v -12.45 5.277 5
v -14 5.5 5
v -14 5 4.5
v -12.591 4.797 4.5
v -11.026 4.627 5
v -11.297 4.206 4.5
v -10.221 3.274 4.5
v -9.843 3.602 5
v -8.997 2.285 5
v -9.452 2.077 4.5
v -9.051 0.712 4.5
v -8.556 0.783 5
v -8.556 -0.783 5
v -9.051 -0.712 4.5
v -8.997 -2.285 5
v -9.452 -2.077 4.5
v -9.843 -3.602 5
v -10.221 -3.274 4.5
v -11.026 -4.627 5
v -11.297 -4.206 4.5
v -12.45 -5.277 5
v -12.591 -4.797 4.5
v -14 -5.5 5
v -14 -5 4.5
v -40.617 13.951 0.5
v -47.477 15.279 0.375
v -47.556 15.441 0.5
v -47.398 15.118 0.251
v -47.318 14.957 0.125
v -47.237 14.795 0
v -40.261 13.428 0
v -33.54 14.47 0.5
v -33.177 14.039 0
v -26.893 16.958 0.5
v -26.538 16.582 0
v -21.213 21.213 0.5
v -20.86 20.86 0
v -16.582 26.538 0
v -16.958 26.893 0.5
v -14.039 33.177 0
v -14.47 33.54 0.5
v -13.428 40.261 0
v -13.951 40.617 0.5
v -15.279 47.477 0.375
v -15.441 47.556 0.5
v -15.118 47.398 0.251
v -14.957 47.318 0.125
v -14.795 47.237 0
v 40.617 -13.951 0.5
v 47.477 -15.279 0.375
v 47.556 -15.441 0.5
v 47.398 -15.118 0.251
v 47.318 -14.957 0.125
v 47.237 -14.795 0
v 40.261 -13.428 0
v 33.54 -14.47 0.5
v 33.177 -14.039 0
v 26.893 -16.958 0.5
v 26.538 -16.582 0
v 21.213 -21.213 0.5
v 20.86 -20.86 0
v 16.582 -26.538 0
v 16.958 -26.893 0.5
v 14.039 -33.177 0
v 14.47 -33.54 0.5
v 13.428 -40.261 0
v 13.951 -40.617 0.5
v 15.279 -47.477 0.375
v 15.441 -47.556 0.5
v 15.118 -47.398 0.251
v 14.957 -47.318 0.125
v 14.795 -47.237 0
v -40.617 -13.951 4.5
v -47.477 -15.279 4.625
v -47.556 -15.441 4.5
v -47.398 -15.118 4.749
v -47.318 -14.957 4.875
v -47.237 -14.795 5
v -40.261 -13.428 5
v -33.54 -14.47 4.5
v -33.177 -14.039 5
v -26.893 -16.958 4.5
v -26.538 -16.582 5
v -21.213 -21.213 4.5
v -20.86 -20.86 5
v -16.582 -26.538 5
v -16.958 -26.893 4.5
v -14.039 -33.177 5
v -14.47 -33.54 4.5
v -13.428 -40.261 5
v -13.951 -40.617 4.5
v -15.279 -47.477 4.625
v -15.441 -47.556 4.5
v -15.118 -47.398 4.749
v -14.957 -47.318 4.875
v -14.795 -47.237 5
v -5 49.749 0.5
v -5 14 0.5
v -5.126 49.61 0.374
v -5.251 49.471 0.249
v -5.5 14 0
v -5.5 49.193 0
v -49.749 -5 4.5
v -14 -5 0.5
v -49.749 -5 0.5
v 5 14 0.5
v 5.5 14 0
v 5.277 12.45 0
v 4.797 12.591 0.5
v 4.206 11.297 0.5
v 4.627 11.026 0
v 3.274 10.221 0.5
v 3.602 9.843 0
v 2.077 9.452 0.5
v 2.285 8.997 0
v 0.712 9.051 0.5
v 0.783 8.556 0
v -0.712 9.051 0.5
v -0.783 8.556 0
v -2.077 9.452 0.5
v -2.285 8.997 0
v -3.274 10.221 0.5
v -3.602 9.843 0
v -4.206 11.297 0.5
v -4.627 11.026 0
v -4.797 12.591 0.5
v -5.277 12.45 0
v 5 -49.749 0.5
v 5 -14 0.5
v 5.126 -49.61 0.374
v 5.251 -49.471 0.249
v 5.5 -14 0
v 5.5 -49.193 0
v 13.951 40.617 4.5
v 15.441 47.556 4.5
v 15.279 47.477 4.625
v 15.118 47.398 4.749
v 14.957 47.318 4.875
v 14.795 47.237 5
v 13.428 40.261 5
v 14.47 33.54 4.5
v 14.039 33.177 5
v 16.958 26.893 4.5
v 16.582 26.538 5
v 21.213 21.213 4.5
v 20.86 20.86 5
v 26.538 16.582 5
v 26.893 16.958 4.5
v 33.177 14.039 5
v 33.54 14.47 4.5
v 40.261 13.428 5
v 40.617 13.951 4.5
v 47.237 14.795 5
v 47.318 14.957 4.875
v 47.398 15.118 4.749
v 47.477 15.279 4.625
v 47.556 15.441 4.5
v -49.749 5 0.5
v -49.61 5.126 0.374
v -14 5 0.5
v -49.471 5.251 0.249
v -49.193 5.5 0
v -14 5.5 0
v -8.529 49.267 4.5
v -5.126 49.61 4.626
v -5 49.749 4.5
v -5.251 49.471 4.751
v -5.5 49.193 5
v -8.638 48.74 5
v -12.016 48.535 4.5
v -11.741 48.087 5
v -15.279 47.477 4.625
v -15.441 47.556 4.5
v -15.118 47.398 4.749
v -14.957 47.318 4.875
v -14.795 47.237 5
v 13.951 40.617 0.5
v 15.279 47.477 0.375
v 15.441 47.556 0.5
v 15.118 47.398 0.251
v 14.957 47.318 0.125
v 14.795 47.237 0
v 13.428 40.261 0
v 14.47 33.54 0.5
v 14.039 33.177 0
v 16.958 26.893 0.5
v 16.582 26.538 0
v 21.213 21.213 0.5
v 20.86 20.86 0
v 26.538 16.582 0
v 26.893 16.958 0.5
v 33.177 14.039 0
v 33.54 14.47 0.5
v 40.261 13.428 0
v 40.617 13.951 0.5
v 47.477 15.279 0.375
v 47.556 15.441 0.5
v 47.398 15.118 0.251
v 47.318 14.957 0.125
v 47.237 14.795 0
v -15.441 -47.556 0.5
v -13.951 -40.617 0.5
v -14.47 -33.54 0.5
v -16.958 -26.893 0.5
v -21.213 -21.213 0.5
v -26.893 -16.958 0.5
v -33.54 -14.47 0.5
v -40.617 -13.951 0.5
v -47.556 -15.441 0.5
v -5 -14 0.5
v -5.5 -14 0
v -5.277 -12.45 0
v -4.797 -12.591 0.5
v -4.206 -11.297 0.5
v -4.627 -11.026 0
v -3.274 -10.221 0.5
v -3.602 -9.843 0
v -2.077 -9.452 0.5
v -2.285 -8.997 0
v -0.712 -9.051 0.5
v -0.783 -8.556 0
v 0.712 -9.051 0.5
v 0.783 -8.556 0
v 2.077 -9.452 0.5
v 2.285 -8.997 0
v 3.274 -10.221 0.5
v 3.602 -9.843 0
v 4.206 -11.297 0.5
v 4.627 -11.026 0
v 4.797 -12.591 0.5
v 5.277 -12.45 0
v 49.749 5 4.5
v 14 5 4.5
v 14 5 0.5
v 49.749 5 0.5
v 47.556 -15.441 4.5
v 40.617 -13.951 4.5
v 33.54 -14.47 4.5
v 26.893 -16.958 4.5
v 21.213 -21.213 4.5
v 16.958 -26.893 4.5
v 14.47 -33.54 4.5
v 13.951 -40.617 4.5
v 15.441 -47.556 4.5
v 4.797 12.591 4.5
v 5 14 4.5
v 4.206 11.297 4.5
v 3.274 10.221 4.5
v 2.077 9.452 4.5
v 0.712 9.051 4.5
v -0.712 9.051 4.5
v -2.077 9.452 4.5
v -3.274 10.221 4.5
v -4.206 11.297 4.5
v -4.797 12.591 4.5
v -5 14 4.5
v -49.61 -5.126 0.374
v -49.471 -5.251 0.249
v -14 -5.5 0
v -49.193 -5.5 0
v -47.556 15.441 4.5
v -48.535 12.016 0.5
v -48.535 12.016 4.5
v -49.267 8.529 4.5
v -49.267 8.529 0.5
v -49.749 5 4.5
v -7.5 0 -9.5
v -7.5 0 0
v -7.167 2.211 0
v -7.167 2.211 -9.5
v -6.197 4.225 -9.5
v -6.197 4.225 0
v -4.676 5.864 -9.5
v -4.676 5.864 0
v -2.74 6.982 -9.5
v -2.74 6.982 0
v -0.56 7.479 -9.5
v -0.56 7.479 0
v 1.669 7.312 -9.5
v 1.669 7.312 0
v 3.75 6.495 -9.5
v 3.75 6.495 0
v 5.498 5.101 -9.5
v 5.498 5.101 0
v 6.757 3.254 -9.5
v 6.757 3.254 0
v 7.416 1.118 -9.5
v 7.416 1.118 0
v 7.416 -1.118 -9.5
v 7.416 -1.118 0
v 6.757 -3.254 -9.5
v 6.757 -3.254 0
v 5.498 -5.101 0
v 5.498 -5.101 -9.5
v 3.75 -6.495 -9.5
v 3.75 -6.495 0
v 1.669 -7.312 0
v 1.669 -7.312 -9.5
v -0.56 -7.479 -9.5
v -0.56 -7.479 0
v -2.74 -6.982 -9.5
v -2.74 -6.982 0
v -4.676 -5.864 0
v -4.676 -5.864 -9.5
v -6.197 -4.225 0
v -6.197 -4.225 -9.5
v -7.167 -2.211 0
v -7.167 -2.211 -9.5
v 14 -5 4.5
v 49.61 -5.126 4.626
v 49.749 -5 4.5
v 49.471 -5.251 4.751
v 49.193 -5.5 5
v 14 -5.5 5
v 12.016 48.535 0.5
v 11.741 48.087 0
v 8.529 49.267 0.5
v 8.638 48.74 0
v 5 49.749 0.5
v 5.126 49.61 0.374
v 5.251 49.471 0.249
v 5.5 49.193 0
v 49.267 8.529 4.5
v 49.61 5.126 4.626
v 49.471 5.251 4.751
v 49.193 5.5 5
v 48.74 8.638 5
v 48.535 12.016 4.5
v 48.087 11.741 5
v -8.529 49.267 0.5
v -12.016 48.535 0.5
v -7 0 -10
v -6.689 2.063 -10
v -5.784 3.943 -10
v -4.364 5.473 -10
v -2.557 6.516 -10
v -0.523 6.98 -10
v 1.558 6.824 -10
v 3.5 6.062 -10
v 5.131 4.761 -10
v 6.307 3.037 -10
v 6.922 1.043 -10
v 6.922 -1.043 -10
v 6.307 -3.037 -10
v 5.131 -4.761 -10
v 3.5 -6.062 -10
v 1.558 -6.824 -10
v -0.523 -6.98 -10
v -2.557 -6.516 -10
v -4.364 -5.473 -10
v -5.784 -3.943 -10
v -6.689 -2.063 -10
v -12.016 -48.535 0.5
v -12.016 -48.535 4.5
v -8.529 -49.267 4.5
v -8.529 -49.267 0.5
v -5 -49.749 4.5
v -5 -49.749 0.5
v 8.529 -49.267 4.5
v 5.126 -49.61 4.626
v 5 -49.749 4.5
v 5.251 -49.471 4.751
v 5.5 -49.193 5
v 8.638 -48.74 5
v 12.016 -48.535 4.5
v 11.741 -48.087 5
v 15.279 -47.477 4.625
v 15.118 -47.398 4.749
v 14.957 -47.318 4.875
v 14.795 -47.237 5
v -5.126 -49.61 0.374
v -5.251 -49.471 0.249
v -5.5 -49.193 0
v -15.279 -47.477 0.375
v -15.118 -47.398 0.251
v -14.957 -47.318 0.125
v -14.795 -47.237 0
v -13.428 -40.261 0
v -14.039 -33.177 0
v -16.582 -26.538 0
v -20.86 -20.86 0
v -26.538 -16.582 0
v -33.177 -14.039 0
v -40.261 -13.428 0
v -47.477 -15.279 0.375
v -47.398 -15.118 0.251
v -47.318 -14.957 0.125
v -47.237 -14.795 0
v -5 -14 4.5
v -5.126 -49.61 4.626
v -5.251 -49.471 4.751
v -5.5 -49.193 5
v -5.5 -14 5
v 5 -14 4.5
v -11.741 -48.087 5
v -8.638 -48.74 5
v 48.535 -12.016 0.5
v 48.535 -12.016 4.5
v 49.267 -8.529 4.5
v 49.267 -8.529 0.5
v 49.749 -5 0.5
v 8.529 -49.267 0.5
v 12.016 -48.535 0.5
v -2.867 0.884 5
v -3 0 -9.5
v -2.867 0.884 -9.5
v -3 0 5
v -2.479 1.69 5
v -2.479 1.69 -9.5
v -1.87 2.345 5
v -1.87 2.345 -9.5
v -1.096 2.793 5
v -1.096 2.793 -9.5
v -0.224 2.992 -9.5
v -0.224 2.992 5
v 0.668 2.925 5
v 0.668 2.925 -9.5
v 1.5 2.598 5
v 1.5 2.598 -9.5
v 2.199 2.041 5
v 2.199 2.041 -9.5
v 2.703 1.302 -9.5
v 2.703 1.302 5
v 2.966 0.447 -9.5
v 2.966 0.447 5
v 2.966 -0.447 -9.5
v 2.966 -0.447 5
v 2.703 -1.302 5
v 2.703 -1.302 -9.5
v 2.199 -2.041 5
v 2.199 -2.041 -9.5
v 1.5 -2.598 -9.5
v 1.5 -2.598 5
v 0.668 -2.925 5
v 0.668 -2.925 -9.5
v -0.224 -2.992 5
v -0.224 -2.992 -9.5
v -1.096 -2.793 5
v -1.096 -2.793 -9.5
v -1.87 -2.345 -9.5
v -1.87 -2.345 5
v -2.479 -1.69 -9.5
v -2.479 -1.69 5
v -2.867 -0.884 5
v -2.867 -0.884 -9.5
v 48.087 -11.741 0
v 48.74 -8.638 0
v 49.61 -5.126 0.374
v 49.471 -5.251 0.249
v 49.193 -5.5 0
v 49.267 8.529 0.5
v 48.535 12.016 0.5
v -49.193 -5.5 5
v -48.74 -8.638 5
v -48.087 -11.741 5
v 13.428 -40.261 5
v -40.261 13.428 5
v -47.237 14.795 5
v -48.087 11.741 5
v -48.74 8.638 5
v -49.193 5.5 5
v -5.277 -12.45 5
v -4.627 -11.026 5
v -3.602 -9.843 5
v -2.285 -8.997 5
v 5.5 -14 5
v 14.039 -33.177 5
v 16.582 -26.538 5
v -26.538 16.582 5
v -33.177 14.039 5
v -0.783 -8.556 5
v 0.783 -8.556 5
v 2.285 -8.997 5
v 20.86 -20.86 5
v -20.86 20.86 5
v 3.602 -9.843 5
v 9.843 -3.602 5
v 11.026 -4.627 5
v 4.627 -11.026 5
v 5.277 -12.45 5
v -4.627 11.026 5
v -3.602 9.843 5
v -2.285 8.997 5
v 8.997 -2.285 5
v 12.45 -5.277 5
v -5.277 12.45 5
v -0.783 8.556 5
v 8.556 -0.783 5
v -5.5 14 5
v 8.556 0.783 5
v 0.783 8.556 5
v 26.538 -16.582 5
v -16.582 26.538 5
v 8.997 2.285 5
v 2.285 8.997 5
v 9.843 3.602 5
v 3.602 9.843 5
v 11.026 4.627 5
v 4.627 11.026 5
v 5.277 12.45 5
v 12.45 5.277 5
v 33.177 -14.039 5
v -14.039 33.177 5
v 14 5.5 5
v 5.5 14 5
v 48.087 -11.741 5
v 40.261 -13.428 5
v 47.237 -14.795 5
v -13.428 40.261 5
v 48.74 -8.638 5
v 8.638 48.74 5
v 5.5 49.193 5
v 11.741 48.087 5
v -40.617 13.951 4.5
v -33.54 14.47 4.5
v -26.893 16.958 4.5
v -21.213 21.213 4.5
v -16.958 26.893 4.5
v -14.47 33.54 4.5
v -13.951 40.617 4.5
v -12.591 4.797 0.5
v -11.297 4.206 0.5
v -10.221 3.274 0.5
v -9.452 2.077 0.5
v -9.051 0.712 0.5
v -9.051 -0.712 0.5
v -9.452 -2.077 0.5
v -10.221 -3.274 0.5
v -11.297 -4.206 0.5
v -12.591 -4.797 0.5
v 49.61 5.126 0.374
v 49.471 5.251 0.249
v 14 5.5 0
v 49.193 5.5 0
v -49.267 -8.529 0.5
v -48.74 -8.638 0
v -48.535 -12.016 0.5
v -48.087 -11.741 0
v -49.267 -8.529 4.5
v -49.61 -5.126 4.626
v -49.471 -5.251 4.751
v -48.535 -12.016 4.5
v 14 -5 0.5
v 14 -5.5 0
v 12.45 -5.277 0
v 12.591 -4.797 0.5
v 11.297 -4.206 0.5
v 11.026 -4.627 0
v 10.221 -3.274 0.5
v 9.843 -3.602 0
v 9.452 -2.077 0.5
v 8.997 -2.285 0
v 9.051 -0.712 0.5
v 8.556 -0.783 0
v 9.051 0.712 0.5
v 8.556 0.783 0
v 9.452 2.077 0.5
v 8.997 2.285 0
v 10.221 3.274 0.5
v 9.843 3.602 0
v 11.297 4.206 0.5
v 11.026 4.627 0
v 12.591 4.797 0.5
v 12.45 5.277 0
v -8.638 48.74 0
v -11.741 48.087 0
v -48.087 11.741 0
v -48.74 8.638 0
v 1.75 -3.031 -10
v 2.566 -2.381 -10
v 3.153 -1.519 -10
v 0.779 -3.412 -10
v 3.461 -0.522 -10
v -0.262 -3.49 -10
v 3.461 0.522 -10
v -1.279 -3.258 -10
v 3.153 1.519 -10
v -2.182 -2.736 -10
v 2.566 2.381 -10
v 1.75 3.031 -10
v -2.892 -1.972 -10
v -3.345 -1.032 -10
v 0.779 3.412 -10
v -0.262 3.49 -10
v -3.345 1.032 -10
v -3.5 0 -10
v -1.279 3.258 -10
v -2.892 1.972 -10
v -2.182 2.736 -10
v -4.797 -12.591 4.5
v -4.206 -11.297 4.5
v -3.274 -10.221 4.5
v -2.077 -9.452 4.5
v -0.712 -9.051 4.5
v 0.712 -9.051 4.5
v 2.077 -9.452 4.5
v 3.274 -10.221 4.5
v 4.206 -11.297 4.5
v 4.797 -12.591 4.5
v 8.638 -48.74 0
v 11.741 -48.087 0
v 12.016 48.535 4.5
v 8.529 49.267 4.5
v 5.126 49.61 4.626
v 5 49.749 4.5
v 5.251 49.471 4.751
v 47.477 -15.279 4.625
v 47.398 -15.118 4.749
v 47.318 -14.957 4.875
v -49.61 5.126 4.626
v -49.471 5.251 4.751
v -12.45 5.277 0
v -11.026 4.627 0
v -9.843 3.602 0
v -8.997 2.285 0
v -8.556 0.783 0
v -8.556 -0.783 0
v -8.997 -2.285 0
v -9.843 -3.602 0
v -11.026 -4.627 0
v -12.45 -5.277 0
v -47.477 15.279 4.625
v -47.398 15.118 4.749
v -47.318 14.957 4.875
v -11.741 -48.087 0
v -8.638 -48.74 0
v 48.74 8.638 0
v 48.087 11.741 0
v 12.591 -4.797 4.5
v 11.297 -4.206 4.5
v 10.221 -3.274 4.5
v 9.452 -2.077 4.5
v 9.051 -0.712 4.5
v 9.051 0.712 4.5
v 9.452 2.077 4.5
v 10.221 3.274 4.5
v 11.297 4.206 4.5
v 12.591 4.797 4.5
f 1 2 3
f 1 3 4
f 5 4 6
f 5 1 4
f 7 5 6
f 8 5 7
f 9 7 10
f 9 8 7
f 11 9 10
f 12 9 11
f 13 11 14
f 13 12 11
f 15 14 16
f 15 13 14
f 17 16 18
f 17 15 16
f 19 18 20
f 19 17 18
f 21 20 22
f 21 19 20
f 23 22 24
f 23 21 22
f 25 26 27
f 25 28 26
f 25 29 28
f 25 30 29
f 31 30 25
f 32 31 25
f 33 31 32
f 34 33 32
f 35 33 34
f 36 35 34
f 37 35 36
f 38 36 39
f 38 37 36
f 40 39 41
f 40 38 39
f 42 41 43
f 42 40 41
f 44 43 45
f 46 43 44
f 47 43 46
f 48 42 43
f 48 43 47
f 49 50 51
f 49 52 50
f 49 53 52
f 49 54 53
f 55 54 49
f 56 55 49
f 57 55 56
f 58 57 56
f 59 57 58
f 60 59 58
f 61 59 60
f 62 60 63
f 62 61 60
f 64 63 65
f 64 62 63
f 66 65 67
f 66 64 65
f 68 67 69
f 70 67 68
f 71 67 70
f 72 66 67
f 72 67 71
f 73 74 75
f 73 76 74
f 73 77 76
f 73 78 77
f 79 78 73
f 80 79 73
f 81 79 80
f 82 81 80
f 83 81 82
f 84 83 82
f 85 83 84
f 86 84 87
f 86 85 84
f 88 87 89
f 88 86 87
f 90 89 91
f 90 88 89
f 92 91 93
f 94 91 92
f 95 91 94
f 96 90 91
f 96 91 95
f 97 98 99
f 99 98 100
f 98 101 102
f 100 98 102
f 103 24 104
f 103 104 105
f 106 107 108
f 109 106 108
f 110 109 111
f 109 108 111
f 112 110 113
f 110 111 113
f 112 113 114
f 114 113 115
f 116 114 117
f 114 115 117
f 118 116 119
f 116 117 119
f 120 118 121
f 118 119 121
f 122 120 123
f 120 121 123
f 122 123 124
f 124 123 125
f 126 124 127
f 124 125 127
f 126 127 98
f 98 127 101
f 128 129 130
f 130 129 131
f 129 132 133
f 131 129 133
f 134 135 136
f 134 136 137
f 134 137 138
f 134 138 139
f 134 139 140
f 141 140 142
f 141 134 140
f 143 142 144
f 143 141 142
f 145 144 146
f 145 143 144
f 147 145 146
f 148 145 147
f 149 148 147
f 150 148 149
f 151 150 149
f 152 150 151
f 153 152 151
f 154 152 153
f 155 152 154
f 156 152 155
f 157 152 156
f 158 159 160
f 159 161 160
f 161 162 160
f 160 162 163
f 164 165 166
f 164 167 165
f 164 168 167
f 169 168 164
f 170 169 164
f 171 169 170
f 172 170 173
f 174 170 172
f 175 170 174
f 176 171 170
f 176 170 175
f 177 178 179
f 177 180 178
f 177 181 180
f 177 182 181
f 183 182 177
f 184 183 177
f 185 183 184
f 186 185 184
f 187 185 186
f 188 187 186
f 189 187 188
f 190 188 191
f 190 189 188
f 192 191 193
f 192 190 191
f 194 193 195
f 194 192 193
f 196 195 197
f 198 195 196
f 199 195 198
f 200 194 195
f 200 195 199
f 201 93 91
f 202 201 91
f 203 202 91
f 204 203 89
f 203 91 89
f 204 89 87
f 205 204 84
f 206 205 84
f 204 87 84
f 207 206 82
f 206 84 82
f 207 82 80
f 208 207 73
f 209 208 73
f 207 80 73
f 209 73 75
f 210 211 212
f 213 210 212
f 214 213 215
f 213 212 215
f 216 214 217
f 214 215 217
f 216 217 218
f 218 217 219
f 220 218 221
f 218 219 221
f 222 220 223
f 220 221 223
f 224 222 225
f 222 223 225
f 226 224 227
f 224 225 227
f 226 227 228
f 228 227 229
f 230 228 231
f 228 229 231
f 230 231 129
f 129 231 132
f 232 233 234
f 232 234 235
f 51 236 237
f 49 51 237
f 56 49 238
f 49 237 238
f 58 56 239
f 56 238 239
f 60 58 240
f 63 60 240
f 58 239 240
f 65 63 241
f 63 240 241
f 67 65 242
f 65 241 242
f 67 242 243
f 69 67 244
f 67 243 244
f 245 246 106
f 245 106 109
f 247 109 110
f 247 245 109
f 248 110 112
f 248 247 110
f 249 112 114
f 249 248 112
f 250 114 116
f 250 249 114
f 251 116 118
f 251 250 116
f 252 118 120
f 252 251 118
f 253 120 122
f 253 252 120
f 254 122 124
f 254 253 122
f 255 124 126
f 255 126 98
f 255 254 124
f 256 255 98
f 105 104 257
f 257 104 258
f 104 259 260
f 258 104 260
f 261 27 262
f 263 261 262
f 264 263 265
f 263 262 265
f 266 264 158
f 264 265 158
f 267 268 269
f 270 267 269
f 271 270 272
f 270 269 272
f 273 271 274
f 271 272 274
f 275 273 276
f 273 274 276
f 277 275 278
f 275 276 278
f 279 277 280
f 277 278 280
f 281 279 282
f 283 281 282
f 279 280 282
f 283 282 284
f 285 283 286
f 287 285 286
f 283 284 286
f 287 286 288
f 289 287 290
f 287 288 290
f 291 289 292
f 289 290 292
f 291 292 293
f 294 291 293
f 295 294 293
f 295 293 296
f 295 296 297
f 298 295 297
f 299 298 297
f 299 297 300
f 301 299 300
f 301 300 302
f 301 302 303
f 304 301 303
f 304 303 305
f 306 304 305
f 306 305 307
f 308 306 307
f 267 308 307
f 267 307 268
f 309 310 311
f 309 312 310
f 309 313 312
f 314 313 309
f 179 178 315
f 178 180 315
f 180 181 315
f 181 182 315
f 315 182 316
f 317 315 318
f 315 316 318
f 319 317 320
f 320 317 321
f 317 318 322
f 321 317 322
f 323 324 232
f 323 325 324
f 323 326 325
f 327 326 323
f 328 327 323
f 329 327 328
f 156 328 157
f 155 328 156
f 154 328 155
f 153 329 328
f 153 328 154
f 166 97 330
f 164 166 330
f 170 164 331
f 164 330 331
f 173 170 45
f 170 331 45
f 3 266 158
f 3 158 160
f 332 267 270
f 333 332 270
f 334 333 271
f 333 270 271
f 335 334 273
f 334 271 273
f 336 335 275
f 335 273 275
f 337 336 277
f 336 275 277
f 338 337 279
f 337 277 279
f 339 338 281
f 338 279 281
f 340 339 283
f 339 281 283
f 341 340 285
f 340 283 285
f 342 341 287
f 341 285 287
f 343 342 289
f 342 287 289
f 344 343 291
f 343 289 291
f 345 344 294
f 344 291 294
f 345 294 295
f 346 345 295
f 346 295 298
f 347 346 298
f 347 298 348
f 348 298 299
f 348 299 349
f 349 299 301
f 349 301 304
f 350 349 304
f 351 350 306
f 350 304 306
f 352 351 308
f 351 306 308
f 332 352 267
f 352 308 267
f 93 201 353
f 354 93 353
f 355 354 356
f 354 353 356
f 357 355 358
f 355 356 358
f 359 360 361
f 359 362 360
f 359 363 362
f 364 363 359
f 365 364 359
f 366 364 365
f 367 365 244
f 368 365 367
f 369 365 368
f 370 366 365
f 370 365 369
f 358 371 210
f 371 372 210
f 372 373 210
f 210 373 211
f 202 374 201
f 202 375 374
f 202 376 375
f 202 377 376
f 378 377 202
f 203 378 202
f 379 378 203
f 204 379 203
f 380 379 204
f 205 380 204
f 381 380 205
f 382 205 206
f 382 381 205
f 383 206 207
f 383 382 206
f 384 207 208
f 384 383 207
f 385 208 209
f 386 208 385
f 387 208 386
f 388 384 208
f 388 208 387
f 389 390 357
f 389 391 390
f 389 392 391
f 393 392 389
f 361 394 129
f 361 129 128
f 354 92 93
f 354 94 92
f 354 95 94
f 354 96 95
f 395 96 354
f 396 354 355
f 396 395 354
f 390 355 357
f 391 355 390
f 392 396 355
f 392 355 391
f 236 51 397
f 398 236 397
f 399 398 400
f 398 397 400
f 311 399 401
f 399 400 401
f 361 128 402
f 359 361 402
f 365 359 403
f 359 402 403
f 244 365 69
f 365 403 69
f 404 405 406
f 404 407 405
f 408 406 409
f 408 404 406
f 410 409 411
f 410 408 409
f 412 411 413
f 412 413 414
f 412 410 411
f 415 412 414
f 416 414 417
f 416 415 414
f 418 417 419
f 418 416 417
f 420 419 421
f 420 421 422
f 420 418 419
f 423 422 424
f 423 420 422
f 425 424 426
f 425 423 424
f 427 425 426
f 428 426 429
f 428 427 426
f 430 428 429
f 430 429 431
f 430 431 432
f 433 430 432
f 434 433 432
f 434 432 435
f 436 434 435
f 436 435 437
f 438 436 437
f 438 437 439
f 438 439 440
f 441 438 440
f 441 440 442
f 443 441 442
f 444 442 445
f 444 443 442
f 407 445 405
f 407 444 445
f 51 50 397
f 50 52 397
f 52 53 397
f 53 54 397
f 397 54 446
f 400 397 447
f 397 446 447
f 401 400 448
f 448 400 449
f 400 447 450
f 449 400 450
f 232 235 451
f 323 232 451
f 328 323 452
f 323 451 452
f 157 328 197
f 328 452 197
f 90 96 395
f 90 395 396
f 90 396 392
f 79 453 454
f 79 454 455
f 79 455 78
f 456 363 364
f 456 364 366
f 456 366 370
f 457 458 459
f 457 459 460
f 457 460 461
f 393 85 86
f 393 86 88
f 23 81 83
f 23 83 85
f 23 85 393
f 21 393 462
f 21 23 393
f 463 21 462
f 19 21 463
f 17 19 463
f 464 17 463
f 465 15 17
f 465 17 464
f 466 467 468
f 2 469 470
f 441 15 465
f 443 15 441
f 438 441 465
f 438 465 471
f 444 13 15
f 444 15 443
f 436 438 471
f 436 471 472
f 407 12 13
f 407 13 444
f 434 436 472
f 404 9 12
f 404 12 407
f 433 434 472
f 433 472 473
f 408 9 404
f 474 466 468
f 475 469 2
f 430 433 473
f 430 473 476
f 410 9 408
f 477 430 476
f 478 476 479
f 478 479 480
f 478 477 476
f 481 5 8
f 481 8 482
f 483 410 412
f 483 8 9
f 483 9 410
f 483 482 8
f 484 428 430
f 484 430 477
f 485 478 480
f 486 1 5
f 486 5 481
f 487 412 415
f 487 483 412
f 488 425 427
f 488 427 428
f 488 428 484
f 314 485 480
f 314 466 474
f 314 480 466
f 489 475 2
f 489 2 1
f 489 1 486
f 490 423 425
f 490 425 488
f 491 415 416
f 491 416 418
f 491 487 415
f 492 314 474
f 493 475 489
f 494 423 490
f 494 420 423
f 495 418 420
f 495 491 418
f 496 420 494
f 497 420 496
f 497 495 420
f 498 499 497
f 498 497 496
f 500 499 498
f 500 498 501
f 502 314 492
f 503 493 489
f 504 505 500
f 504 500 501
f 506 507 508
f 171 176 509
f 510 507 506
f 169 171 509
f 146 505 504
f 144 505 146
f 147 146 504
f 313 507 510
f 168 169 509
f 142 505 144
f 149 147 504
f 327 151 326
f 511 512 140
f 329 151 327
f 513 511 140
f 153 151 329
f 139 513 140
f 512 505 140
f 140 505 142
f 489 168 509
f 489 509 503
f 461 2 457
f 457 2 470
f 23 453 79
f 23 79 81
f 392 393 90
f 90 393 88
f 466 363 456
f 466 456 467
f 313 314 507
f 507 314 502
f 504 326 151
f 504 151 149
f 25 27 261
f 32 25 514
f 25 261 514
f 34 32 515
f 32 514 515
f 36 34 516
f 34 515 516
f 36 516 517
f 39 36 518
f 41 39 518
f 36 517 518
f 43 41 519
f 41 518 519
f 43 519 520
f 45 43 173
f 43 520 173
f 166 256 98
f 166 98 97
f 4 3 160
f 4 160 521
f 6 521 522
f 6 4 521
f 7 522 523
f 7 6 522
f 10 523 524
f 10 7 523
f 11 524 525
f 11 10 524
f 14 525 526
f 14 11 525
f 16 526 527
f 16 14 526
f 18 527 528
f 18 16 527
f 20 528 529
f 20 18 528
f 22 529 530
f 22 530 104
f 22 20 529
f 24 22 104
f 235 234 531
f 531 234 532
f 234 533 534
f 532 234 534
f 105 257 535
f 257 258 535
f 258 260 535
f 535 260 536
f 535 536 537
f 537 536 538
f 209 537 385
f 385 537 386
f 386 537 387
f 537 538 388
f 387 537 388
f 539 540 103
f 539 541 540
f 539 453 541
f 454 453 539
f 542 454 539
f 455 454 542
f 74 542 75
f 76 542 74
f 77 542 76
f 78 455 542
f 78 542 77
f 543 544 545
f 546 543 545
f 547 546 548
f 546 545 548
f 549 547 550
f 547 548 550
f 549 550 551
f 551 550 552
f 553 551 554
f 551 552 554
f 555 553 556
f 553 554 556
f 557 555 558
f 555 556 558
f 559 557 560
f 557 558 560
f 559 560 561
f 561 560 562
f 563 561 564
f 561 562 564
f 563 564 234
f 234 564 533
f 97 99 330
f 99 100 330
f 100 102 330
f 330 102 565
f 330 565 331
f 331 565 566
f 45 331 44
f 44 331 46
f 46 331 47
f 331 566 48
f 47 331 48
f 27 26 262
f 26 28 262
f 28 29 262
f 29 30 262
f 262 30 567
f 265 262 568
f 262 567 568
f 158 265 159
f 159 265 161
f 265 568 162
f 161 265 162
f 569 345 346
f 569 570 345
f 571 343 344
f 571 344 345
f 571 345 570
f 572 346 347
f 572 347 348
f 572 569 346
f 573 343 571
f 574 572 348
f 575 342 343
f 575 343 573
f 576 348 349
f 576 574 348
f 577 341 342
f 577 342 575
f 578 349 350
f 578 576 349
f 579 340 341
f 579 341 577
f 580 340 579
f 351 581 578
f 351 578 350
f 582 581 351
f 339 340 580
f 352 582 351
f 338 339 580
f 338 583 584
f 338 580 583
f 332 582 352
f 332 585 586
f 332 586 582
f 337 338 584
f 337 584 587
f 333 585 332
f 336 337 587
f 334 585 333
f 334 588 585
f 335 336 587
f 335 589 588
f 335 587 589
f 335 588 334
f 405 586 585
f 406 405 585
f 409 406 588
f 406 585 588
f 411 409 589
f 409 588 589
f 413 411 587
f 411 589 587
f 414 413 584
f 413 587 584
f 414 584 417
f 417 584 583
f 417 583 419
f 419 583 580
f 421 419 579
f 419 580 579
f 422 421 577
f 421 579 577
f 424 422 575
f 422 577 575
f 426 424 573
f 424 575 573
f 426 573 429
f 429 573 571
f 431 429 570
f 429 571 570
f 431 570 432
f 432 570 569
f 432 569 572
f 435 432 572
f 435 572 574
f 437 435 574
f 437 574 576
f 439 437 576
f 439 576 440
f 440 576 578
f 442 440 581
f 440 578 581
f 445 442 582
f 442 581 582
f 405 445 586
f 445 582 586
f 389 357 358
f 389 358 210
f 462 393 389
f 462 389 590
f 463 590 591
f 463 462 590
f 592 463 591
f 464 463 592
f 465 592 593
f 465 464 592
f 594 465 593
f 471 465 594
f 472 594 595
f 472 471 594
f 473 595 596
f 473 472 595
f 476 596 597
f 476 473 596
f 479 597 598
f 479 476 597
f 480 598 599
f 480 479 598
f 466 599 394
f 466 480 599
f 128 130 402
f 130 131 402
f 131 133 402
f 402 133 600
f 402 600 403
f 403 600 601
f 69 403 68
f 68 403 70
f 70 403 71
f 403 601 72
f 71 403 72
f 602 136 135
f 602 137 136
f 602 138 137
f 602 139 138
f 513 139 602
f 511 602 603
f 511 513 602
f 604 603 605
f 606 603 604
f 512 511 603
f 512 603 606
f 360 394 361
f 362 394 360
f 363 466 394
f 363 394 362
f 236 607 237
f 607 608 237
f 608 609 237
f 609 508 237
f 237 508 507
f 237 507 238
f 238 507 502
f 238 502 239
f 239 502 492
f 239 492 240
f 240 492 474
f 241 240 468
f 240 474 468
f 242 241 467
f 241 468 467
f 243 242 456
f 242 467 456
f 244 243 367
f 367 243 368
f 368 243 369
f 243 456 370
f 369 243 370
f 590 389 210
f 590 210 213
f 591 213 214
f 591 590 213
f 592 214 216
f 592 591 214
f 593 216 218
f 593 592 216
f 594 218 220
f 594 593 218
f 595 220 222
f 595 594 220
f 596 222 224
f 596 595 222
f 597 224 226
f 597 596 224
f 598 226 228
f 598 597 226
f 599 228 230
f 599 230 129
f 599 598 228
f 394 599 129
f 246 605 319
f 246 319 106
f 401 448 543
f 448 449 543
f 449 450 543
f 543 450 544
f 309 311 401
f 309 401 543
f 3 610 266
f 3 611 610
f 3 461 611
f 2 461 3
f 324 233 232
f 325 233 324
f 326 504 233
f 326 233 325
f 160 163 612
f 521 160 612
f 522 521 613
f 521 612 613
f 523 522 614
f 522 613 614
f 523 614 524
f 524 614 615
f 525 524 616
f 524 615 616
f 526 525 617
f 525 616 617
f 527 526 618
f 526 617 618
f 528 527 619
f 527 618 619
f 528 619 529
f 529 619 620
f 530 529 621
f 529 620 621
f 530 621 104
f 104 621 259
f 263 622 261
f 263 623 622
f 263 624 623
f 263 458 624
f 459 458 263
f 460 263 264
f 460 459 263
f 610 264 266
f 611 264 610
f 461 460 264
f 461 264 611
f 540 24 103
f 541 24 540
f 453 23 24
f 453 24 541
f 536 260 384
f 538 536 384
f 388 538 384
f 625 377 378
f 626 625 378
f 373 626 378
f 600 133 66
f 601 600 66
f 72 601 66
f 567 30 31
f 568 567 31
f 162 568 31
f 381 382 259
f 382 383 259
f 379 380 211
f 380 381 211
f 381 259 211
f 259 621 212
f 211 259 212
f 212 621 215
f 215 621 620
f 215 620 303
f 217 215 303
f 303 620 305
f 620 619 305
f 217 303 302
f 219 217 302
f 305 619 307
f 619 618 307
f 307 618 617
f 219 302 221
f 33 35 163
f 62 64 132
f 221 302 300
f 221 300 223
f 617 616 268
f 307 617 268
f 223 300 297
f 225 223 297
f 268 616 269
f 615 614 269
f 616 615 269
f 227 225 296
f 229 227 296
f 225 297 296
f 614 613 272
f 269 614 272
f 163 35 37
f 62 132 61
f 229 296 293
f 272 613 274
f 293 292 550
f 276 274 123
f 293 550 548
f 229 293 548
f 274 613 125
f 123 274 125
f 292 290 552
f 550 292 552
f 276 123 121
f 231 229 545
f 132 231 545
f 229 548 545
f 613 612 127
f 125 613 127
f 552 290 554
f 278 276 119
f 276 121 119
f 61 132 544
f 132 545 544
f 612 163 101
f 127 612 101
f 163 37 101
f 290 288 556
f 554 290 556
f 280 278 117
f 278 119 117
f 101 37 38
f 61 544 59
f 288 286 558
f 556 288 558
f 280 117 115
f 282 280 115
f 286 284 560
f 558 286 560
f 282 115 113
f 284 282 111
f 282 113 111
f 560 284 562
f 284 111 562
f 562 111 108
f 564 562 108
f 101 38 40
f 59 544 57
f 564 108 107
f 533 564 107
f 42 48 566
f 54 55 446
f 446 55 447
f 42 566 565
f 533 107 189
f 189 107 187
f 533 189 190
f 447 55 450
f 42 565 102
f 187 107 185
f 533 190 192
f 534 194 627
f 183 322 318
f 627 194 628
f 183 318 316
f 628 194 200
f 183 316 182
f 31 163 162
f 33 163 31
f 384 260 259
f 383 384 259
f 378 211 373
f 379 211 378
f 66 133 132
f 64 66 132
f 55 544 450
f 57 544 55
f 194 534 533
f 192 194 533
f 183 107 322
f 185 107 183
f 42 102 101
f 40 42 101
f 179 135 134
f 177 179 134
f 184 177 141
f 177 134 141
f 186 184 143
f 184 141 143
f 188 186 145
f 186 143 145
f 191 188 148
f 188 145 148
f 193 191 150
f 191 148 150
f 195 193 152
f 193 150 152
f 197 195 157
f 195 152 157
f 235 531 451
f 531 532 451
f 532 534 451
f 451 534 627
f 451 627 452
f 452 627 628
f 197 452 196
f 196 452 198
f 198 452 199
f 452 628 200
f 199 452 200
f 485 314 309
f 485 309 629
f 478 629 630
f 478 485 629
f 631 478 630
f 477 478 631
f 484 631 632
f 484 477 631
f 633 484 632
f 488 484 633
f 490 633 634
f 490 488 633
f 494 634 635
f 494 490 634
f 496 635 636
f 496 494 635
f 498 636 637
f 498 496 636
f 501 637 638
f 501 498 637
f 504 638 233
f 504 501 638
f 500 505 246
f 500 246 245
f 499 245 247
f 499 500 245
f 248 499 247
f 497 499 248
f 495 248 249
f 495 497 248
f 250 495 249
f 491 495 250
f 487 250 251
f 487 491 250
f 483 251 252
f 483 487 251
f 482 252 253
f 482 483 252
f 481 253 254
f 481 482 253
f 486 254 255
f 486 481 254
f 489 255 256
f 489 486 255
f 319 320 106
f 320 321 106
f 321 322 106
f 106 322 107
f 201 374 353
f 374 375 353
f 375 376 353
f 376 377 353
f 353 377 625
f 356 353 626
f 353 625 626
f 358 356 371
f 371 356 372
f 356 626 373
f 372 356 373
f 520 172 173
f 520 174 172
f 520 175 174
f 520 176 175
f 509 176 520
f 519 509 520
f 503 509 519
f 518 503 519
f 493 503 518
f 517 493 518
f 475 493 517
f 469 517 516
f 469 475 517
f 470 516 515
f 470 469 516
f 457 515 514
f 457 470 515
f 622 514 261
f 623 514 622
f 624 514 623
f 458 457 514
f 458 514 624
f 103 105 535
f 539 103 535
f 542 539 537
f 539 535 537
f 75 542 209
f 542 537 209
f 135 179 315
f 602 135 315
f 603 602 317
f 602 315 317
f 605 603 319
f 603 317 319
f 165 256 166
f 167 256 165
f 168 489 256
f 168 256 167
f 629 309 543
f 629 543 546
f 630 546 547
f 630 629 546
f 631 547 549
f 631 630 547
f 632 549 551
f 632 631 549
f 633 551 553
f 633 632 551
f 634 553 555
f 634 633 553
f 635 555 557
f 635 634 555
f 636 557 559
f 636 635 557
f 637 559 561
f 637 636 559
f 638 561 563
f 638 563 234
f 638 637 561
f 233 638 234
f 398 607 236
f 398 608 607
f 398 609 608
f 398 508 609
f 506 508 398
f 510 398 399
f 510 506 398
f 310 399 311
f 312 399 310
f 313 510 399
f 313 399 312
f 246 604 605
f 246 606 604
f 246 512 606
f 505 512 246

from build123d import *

# Parameters (mm, degrees)
SKETCH1_R                = 50
SKETCH1_R_2              = 3
BOSS_EXTRUDE1_DEPTH      = 5
SKETCH2_R                = 25
CUT_EXTRUDE1_DEPTH       = 71.887234394
CHAMFER1_SIZE            = 0.5
BOSS_EXTRUDE3_DEPTH      = 10
BOSS_EXTRUDE3_DEPTH_BACK = 5
SKETCH4_R                = 7.5
SKETCH4_R_2              = 3
CHAMFER2_SIZE            = 0.5


with BuildPart() as part:
    # Sketch1 → Boss-Extrude1 (new body)
    with BuildSketch(Plane.XY):
        Circle(SKETCH1_R)
        Circle(SKETCH1_R_2, mode=Mode.SUBTRACT)
    extrude(amount=BOSS_EXTRUDE1_DEPTH)

    # Sketch2 → Cut-Extrude1 (cut, through all)
    with BuildSketch(Plane.XY.offset(5)):
        with Locations((38.890872965, 38.890872965)):
            Circle(SKETCH2_R)
        with Locations((38.890872965, -38.890872965)):
            Circle(SKETCH2_R)
        with Locations((-38.890872965, -38.890872965)):
            Circle(SKETCH2_R)
        with Locations((-38.890872965, 38.890872965)):
            Circle(SKETCH2_R)
        with BuildLine():
            Line((-5, 14), (-5, 86))
            ThreePointArc((-5, 86), (0, 91), (5, 86))
            Line((5, 86), (5, 14))
            ThreePointArc((5, 14), (0, 9), (-5, 14))
        make_face()
        with BuildLine():
            Line((14, 5), (86, 5))
            ThreePointArc((86, 5), (91, 0), (86, -5))
            Line((86, -5), (14, -5))
            ThreePointArc((14, -5), (9, 0), (14, 5))
        make_face()
        with BuildLine():
            Line((5, -14), (5, -86))
            ThreePointArc((5, -86), (0, -91), (-5, -86))
            Line((-5, -86), (-5, -14))
            ThreePointArc((-5, -14), (0, -9), (5, -14))
        make_face()
        with BuildLine():
            Line((-14, -5), (-86, -5))
            ThreePointArc((-86, -5), (-91, 0), (-86, 5))
            Line((-86, 5), (-14, 5))
            ThreePointArc((-14, 5), (-9, 0), (-14, -5))
        make_face()
    extrude(amount=-CUT_EXTRUDE1_DEPTH, mode=Mode.SUBTRACT)

    # Chamfer1
    chamfer1_edges = [part.edges().sort_by_distance(p)[0] for p in [
        (-10.27898673, 48.932018473, 0),
        (-5, 31.874685928, 0),
        (5, 31.874685928, 0),
        (5, 31.874685928, 5),
        (-5, 31.874685928, 5),
        (0, 9, 5),
        (0, 9, 0),
        (-48.932018473, 10.27898673, 5),
        (-48.932018473, -10.27898673, 5),
        (-10.27898673, -48.932018473, 5),
        (10.27898673, -48.932018473, 5),
        (48.932018473, -10.27898673, 5),
        (48.932018473, 10.27898673, 5),
        (10.27898673, 48.932018473, 5),
        (-48.932018473, 10.27898673, 0),
        (-48.932018473, -10.27898673, 0),
        (-10.27898673, -48.932018473, 0),
        (10.27898673, -48.932018473, 0),
        (48.932018473, -10.27898673, 0),
        (48.932018473, 10.27898673, 0),
        (10.27898673, 48.932018473, 0),
        (-3, 0, 0),
        (-3, 0, 5),
        (-31.874685928, -5, 0),
        (-31.874685928, 5, 0),
        (-31.874685928, 5, 5),
        (-31.874685928, -5, 5),
        (-9, 0, 5),
        (-9, 0, 0),
        (21.213203436, -21.213203436, 0),
        (21.213203436, -21.213203436, 5),
        (-21.213203436, -21.213203436, 0),
        (-21.213203436, -21.213203436, 5),
        (-21.213203436, 21.213203436, 0),
        (-21.213203436, 21.213203436, 5),
        (5, -31.874685928, 0),
        (-5, -31.874685928, 0),
        (-5, -31.874685928, 5),
        (5, -31.874685928, 5),
        (0, -9, 5),
        (0, -9, 0),
        (31.874685928, 5, 0),
        (31.874685928, -5, 0),
        (31.874685928, -5, 5),
        (31.874685928, 5, 5),
        (9, 0, 5),
        (9, 0, 0),
        (21.213203436, 21.213203436, 0),
        (21.213203436, 21.213203436, 5),
        (-10.27898673, 48.932018473, 5),
    ]]
    chamfer(chamfer1_edges, length=CHAMFER1_SIZE)

    # Sketch4 → Boss-Extrude3 (add, two sides: drawn at the far end of the back side and taken through both)
    with BuildSketch(Plane(origin=(0, 0, 0), x_dir=(-1, 0, 0), z_dir=(0, 0, -1)).offset(-BOSS_EXTRUDE3_DEPTH_BACK)):
        Circle(SKETCH4_R)
        Circle(SKETCH4_R_2, mode=Mode.SUBTRACT)
    extrude(amount=BOSS_EXTRUDE3_DEPTH + BOSS_EXTRUDE3_DEPTH_BACK)

    # Chamfer2
    chamfer2_edges = [part.edges().sort_by_distance(p)[0] for p in [
        (3, 0, -10),
        (7.5, 0, -10),
    ]]
    chamfer(chamfer2_edges, length=CHAMFER2_SIZE)


solid = part.part
